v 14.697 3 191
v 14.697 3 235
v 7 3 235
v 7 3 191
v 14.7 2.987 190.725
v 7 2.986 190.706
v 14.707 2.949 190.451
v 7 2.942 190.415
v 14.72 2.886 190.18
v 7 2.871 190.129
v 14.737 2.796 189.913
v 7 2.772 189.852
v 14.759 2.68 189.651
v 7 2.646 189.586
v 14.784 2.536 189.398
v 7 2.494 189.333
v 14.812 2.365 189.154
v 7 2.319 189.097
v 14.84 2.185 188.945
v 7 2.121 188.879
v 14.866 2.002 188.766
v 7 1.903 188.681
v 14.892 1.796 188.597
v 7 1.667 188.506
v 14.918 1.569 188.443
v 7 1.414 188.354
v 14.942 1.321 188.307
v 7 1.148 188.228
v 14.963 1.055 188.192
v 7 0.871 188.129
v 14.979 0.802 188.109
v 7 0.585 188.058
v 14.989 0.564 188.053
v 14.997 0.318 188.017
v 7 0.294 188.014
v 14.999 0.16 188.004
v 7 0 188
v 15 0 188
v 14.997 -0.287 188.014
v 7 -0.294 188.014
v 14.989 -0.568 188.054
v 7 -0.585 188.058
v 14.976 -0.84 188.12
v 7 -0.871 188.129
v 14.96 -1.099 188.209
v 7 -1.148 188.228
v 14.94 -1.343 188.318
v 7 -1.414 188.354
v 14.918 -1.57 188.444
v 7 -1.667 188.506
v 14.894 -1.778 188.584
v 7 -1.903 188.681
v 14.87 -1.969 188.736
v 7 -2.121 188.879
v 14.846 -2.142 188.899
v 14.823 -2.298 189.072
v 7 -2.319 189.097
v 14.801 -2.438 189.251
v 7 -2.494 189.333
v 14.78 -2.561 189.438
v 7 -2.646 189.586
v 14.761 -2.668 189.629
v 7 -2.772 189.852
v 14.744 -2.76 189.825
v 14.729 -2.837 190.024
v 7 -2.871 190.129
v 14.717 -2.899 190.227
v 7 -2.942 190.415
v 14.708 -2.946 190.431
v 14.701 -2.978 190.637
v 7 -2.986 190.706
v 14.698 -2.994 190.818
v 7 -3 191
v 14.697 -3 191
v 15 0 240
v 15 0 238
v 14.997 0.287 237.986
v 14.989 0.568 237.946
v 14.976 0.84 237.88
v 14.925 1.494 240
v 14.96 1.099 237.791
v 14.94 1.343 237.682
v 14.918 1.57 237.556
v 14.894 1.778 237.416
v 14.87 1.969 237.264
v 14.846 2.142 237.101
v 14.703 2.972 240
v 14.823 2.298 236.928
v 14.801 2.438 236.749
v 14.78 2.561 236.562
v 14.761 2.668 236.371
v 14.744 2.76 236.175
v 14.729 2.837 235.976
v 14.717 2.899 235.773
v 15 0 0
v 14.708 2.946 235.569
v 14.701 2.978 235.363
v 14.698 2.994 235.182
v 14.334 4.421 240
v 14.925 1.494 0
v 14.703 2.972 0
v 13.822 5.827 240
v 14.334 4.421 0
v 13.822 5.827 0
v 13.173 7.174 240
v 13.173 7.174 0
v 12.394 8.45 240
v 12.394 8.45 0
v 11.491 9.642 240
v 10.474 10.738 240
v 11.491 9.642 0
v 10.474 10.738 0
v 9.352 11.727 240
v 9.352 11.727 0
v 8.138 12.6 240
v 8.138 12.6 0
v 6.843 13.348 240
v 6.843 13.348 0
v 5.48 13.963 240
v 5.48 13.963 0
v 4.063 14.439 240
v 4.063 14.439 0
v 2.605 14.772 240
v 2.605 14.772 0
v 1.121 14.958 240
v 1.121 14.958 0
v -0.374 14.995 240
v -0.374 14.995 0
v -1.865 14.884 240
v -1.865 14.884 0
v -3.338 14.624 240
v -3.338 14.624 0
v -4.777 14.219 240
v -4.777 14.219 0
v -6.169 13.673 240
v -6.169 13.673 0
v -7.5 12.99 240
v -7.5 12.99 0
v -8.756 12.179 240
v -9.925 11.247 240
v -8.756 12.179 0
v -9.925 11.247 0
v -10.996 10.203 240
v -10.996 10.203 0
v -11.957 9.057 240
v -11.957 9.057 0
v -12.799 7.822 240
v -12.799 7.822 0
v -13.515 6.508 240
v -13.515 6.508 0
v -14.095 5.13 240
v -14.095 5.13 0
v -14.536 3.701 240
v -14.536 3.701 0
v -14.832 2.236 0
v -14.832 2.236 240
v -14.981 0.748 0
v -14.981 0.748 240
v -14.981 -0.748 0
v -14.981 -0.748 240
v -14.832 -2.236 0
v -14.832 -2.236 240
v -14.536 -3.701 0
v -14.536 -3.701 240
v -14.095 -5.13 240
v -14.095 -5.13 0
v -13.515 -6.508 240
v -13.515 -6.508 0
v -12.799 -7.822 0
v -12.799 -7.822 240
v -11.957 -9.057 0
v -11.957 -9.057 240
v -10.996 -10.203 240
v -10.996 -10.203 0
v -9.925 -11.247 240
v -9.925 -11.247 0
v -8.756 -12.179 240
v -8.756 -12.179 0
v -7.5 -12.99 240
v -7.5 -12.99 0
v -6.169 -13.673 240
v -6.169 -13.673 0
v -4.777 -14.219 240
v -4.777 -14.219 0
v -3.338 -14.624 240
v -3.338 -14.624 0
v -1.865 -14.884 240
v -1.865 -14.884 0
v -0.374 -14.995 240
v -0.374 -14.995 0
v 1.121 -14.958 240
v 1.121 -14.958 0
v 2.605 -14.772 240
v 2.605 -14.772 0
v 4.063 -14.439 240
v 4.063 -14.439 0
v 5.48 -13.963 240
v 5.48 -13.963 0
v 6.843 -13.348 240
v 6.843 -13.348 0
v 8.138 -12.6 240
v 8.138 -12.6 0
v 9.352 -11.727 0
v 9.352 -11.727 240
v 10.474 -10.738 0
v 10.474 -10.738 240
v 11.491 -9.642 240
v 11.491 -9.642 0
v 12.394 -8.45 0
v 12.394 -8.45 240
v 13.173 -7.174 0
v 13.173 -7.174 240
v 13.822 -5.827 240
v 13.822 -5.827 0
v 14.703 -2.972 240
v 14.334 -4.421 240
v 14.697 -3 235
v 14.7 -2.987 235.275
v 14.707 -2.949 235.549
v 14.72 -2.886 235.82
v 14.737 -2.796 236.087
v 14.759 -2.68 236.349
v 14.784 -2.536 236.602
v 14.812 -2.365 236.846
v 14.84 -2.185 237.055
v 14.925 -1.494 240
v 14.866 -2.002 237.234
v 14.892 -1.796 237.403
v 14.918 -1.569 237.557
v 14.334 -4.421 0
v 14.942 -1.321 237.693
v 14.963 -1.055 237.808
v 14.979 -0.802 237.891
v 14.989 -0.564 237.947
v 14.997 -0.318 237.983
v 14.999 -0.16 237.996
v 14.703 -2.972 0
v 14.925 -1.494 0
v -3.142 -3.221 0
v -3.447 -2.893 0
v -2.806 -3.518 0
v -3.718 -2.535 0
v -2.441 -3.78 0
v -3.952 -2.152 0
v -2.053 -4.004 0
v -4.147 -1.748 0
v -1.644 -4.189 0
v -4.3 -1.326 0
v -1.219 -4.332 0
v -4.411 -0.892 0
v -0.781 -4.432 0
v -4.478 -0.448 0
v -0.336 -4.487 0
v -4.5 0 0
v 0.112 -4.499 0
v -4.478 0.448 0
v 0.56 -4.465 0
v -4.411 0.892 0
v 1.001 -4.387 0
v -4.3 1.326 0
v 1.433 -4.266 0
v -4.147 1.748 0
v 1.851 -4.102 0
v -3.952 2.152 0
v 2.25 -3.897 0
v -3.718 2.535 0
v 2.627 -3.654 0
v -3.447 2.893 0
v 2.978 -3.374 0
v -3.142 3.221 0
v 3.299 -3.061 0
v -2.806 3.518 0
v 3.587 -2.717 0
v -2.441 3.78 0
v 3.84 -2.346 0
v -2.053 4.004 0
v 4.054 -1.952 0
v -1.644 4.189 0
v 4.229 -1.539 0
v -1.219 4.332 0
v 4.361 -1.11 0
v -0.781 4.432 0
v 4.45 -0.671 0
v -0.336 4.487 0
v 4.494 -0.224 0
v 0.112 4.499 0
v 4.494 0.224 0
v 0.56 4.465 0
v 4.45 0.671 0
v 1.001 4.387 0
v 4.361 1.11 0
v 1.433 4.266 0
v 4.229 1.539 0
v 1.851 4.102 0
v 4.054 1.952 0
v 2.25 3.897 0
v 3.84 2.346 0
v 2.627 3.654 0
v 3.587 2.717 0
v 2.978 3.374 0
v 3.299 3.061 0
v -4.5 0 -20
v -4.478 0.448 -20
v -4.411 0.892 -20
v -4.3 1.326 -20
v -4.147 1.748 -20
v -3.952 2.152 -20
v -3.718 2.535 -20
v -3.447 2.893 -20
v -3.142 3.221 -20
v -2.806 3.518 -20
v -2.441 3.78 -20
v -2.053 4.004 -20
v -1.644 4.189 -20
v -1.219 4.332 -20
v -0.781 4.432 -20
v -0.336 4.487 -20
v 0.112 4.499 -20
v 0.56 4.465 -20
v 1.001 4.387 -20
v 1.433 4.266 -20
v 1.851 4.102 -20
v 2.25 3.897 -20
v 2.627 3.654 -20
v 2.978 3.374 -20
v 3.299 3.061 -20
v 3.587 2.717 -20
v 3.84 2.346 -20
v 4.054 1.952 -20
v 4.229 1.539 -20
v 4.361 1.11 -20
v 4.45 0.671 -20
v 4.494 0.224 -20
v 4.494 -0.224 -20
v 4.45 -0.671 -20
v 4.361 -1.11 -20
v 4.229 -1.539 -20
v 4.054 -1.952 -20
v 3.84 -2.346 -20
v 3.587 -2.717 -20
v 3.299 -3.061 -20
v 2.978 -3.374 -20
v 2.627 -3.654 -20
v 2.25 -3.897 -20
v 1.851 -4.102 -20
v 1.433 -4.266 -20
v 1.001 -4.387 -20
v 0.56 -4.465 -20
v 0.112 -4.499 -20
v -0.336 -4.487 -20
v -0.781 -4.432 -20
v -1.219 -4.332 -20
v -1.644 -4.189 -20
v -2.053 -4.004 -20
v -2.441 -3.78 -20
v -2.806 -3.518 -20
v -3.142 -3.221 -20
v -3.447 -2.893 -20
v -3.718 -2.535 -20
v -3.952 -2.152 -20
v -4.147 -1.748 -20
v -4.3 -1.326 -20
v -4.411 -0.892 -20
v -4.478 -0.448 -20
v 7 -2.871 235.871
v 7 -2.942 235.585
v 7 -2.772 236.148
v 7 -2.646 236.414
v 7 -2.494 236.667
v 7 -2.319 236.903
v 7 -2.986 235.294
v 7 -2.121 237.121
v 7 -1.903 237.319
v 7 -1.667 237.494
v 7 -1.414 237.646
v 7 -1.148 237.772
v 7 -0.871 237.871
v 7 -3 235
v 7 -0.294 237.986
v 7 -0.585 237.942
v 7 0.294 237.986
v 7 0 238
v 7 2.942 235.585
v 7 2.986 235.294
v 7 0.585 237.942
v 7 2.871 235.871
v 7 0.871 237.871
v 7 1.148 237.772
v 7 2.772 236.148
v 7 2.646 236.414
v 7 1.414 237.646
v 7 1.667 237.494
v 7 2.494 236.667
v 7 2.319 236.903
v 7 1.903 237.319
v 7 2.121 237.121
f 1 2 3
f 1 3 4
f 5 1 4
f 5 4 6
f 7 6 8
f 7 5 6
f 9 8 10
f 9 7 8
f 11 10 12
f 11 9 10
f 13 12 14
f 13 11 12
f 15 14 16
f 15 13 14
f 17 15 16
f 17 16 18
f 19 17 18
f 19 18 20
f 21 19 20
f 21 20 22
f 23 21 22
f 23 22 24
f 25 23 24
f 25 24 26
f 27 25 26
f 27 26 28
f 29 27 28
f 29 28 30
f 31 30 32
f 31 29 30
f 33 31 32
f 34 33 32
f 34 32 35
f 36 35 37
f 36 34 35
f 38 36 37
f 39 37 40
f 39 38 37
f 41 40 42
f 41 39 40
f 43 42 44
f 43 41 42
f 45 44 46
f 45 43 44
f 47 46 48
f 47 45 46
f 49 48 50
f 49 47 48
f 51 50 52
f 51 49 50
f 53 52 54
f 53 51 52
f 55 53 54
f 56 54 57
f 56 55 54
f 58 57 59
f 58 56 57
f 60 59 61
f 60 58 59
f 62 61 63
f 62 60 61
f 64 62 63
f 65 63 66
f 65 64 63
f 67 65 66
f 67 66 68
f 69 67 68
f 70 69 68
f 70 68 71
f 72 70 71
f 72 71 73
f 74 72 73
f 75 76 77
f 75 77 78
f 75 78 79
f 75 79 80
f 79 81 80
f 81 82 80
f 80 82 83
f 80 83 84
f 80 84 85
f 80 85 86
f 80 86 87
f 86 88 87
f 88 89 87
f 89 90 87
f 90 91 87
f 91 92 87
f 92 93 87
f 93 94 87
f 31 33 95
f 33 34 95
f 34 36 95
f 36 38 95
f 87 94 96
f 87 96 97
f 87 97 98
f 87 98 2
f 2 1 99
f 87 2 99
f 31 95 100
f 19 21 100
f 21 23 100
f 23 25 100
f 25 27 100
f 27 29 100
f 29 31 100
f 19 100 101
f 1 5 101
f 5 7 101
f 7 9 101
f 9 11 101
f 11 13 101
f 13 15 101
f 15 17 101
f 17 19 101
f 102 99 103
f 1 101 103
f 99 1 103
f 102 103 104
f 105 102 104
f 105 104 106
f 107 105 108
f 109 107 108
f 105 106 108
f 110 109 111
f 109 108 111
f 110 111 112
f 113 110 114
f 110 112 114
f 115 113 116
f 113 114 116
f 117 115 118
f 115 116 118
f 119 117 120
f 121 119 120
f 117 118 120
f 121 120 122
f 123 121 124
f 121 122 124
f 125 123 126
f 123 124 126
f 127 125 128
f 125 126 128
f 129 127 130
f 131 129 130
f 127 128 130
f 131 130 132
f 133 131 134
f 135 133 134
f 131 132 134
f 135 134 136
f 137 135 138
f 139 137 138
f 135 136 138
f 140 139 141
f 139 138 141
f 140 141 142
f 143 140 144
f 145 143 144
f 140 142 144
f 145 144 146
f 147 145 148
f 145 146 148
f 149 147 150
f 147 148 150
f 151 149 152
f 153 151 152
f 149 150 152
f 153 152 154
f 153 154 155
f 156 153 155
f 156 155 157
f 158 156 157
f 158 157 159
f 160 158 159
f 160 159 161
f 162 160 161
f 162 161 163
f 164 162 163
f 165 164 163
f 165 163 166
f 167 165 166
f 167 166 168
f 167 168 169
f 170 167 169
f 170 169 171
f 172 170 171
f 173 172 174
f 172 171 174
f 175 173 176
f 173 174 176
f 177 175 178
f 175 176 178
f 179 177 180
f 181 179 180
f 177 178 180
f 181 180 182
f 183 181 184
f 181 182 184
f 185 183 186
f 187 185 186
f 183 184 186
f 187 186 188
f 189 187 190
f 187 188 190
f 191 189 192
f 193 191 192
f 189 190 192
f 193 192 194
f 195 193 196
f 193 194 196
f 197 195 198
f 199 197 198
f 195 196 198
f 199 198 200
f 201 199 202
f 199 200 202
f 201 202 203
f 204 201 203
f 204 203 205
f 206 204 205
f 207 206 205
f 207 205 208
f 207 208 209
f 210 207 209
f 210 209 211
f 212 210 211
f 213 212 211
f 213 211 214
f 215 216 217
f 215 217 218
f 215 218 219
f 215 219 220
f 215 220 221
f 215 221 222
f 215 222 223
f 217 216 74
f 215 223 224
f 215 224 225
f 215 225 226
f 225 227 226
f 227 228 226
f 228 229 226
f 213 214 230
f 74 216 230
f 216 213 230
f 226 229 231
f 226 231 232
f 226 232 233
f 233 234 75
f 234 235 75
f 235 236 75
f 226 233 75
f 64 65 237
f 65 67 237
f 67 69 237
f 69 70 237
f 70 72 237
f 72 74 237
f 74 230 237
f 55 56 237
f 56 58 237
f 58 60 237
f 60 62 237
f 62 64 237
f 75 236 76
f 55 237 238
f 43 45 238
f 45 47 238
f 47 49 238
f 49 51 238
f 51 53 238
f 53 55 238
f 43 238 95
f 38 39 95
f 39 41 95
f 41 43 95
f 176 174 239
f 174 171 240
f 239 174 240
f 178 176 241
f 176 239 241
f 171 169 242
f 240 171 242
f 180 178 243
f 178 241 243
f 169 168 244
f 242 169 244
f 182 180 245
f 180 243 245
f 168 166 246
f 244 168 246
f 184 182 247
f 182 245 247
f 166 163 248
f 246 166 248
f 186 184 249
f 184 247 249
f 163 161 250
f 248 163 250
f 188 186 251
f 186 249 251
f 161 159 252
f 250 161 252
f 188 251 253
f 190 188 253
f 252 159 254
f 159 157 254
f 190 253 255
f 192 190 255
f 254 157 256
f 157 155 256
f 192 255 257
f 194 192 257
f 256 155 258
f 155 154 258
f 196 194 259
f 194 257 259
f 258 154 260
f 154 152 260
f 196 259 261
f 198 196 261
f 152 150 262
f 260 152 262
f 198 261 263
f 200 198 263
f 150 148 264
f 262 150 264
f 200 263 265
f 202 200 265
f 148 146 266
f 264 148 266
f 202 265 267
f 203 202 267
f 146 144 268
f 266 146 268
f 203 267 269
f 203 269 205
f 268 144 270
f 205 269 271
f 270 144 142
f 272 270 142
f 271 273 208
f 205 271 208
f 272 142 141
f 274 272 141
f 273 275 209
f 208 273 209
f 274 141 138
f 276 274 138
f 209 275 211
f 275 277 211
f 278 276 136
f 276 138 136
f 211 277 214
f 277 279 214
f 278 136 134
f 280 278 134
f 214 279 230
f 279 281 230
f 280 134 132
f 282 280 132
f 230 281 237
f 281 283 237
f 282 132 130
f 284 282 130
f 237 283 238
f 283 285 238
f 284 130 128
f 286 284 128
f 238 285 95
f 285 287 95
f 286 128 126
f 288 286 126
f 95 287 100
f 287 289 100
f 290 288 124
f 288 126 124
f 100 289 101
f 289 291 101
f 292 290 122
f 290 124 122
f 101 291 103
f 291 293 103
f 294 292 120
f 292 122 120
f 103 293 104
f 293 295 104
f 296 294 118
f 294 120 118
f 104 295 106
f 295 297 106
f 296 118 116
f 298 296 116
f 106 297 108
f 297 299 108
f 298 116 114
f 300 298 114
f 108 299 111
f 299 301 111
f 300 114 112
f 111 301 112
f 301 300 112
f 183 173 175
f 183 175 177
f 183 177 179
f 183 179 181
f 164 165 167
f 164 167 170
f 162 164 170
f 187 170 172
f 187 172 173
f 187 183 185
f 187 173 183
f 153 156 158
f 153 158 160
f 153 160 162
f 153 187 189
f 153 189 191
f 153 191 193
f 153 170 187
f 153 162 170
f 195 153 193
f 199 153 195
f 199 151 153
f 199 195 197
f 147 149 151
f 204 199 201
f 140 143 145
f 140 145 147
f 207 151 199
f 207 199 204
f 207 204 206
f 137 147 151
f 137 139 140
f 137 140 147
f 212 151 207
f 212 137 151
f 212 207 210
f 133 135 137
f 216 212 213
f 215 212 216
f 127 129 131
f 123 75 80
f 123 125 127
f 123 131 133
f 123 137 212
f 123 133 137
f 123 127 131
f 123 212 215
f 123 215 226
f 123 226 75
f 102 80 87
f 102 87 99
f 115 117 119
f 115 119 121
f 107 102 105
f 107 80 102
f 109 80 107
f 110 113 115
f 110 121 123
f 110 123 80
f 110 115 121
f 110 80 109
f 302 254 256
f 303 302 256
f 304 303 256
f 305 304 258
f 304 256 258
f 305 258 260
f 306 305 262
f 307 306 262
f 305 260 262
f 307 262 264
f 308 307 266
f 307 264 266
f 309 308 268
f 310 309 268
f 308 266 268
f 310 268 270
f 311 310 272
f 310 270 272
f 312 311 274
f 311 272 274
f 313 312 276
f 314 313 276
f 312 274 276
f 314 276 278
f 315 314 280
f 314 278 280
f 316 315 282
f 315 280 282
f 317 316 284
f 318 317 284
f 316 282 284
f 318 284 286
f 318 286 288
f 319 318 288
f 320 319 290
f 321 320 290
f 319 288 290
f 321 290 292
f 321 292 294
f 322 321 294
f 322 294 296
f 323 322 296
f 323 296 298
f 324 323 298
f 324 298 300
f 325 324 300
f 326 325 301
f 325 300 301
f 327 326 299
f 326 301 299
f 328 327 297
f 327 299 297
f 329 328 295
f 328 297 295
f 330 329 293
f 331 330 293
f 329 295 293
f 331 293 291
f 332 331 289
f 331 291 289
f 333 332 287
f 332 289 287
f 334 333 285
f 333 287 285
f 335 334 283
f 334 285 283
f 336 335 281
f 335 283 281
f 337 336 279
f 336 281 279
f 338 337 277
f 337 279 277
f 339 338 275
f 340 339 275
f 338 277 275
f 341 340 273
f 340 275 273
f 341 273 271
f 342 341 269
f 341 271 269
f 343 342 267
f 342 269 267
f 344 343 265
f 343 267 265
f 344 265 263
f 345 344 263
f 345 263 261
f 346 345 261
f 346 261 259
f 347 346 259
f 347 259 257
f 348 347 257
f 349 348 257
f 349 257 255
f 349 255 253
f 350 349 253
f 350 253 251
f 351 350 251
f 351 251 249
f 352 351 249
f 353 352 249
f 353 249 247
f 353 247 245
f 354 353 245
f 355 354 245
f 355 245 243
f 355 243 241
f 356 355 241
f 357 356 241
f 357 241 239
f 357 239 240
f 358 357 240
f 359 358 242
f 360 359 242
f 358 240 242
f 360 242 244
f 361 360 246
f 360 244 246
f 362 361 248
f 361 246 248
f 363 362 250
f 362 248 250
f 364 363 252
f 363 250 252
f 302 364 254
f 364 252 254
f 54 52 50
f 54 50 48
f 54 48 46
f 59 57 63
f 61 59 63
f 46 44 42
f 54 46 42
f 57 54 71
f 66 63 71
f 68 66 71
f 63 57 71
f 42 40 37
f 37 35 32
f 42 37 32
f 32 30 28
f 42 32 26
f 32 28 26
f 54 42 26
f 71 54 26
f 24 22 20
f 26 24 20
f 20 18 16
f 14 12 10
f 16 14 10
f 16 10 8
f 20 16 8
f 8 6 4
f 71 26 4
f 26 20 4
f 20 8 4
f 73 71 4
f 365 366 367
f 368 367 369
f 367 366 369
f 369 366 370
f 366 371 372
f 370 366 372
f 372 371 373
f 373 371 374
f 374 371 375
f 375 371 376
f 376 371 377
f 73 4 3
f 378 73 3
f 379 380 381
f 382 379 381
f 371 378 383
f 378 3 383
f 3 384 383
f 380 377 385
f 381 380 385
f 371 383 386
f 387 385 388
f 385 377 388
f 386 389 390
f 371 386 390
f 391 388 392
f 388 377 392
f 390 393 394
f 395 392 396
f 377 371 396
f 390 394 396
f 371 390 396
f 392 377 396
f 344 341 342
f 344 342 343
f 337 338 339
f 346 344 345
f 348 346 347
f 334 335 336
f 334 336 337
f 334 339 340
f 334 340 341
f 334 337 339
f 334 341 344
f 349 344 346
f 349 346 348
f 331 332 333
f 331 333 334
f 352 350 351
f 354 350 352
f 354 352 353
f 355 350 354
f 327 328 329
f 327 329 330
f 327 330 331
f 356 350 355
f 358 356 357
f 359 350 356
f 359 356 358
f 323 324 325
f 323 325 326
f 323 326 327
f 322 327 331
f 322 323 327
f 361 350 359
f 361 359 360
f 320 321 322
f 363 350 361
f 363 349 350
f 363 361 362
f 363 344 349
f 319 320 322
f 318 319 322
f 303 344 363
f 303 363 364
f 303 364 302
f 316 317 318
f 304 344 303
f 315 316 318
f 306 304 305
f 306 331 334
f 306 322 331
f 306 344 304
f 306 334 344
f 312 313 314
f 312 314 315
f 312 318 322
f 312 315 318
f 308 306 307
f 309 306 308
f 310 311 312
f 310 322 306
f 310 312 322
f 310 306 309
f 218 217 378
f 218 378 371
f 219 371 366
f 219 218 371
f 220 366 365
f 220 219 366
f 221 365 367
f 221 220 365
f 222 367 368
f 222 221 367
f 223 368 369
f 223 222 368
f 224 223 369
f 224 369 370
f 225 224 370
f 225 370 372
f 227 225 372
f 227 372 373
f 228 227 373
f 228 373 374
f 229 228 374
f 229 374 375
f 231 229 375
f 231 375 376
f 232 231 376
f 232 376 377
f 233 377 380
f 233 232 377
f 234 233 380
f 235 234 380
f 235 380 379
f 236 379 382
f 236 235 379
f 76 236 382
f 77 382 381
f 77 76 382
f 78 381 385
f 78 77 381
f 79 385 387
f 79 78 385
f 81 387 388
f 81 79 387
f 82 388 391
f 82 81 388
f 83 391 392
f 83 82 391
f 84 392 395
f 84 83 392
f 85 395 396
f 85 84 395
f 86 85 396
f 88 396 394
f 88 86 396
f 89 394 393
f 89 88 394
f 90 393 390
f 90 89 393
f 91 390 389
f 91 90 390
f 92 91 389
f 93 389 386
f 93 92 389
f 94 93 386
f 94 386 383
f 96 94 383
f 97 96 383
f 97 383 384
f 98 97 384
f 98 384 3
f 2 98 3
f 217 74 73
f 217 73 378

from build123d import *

# Parameters (mm, degrees)
SKETCH_1_R          = 15
EXTRUDE_1_DEPTH     = 240
SKETCH_4_R          = 4.5
EXTRUDE_2_DEPTH     = 20
CUT_EXTRUDE_3_DEPTH = 8


with BuildPart() as part:
    # 草图1 → 凸台-拉伸1 (new body)
    with BuildSketch(Plane.XY):
        Circle(SKETCH_1_R)
    extrude(amount=EXTRUDE_1_DEPTH)

    # 草图4 → 凸台-拉伸2 (add)
    with BuildSketch(Plane(origin=(0, 0, 0), x_dir=(-1, 0, 0), z_dir=(0, 0, -1))):
        Circle(SKETCH_4_R)
    extrude(amount=EXTRUDE_2_DEPTH)

    # 草图5 → 切除-拉伸3 (cut)
    with BuildSketch(Plane(origin=(15, 0, 0), x_dir=(0, 0, -1), z_dir=(1, 0, 0))):
        with BuildLine():
            Line((-235, 3), (-191, 3))
            ThreePointArc((-191, 3), (-188, 0), (-191, -3))
            Line((-191, -3), (-235, -3))
            ThreePointArc((-235, -3), (-238, 0), (-235, 3))
        make_face()
    extrude(amount=-CUT_EXTRUDE_3_DEPTH, mode=Mode.SUBTRACT)


solid = part.part
